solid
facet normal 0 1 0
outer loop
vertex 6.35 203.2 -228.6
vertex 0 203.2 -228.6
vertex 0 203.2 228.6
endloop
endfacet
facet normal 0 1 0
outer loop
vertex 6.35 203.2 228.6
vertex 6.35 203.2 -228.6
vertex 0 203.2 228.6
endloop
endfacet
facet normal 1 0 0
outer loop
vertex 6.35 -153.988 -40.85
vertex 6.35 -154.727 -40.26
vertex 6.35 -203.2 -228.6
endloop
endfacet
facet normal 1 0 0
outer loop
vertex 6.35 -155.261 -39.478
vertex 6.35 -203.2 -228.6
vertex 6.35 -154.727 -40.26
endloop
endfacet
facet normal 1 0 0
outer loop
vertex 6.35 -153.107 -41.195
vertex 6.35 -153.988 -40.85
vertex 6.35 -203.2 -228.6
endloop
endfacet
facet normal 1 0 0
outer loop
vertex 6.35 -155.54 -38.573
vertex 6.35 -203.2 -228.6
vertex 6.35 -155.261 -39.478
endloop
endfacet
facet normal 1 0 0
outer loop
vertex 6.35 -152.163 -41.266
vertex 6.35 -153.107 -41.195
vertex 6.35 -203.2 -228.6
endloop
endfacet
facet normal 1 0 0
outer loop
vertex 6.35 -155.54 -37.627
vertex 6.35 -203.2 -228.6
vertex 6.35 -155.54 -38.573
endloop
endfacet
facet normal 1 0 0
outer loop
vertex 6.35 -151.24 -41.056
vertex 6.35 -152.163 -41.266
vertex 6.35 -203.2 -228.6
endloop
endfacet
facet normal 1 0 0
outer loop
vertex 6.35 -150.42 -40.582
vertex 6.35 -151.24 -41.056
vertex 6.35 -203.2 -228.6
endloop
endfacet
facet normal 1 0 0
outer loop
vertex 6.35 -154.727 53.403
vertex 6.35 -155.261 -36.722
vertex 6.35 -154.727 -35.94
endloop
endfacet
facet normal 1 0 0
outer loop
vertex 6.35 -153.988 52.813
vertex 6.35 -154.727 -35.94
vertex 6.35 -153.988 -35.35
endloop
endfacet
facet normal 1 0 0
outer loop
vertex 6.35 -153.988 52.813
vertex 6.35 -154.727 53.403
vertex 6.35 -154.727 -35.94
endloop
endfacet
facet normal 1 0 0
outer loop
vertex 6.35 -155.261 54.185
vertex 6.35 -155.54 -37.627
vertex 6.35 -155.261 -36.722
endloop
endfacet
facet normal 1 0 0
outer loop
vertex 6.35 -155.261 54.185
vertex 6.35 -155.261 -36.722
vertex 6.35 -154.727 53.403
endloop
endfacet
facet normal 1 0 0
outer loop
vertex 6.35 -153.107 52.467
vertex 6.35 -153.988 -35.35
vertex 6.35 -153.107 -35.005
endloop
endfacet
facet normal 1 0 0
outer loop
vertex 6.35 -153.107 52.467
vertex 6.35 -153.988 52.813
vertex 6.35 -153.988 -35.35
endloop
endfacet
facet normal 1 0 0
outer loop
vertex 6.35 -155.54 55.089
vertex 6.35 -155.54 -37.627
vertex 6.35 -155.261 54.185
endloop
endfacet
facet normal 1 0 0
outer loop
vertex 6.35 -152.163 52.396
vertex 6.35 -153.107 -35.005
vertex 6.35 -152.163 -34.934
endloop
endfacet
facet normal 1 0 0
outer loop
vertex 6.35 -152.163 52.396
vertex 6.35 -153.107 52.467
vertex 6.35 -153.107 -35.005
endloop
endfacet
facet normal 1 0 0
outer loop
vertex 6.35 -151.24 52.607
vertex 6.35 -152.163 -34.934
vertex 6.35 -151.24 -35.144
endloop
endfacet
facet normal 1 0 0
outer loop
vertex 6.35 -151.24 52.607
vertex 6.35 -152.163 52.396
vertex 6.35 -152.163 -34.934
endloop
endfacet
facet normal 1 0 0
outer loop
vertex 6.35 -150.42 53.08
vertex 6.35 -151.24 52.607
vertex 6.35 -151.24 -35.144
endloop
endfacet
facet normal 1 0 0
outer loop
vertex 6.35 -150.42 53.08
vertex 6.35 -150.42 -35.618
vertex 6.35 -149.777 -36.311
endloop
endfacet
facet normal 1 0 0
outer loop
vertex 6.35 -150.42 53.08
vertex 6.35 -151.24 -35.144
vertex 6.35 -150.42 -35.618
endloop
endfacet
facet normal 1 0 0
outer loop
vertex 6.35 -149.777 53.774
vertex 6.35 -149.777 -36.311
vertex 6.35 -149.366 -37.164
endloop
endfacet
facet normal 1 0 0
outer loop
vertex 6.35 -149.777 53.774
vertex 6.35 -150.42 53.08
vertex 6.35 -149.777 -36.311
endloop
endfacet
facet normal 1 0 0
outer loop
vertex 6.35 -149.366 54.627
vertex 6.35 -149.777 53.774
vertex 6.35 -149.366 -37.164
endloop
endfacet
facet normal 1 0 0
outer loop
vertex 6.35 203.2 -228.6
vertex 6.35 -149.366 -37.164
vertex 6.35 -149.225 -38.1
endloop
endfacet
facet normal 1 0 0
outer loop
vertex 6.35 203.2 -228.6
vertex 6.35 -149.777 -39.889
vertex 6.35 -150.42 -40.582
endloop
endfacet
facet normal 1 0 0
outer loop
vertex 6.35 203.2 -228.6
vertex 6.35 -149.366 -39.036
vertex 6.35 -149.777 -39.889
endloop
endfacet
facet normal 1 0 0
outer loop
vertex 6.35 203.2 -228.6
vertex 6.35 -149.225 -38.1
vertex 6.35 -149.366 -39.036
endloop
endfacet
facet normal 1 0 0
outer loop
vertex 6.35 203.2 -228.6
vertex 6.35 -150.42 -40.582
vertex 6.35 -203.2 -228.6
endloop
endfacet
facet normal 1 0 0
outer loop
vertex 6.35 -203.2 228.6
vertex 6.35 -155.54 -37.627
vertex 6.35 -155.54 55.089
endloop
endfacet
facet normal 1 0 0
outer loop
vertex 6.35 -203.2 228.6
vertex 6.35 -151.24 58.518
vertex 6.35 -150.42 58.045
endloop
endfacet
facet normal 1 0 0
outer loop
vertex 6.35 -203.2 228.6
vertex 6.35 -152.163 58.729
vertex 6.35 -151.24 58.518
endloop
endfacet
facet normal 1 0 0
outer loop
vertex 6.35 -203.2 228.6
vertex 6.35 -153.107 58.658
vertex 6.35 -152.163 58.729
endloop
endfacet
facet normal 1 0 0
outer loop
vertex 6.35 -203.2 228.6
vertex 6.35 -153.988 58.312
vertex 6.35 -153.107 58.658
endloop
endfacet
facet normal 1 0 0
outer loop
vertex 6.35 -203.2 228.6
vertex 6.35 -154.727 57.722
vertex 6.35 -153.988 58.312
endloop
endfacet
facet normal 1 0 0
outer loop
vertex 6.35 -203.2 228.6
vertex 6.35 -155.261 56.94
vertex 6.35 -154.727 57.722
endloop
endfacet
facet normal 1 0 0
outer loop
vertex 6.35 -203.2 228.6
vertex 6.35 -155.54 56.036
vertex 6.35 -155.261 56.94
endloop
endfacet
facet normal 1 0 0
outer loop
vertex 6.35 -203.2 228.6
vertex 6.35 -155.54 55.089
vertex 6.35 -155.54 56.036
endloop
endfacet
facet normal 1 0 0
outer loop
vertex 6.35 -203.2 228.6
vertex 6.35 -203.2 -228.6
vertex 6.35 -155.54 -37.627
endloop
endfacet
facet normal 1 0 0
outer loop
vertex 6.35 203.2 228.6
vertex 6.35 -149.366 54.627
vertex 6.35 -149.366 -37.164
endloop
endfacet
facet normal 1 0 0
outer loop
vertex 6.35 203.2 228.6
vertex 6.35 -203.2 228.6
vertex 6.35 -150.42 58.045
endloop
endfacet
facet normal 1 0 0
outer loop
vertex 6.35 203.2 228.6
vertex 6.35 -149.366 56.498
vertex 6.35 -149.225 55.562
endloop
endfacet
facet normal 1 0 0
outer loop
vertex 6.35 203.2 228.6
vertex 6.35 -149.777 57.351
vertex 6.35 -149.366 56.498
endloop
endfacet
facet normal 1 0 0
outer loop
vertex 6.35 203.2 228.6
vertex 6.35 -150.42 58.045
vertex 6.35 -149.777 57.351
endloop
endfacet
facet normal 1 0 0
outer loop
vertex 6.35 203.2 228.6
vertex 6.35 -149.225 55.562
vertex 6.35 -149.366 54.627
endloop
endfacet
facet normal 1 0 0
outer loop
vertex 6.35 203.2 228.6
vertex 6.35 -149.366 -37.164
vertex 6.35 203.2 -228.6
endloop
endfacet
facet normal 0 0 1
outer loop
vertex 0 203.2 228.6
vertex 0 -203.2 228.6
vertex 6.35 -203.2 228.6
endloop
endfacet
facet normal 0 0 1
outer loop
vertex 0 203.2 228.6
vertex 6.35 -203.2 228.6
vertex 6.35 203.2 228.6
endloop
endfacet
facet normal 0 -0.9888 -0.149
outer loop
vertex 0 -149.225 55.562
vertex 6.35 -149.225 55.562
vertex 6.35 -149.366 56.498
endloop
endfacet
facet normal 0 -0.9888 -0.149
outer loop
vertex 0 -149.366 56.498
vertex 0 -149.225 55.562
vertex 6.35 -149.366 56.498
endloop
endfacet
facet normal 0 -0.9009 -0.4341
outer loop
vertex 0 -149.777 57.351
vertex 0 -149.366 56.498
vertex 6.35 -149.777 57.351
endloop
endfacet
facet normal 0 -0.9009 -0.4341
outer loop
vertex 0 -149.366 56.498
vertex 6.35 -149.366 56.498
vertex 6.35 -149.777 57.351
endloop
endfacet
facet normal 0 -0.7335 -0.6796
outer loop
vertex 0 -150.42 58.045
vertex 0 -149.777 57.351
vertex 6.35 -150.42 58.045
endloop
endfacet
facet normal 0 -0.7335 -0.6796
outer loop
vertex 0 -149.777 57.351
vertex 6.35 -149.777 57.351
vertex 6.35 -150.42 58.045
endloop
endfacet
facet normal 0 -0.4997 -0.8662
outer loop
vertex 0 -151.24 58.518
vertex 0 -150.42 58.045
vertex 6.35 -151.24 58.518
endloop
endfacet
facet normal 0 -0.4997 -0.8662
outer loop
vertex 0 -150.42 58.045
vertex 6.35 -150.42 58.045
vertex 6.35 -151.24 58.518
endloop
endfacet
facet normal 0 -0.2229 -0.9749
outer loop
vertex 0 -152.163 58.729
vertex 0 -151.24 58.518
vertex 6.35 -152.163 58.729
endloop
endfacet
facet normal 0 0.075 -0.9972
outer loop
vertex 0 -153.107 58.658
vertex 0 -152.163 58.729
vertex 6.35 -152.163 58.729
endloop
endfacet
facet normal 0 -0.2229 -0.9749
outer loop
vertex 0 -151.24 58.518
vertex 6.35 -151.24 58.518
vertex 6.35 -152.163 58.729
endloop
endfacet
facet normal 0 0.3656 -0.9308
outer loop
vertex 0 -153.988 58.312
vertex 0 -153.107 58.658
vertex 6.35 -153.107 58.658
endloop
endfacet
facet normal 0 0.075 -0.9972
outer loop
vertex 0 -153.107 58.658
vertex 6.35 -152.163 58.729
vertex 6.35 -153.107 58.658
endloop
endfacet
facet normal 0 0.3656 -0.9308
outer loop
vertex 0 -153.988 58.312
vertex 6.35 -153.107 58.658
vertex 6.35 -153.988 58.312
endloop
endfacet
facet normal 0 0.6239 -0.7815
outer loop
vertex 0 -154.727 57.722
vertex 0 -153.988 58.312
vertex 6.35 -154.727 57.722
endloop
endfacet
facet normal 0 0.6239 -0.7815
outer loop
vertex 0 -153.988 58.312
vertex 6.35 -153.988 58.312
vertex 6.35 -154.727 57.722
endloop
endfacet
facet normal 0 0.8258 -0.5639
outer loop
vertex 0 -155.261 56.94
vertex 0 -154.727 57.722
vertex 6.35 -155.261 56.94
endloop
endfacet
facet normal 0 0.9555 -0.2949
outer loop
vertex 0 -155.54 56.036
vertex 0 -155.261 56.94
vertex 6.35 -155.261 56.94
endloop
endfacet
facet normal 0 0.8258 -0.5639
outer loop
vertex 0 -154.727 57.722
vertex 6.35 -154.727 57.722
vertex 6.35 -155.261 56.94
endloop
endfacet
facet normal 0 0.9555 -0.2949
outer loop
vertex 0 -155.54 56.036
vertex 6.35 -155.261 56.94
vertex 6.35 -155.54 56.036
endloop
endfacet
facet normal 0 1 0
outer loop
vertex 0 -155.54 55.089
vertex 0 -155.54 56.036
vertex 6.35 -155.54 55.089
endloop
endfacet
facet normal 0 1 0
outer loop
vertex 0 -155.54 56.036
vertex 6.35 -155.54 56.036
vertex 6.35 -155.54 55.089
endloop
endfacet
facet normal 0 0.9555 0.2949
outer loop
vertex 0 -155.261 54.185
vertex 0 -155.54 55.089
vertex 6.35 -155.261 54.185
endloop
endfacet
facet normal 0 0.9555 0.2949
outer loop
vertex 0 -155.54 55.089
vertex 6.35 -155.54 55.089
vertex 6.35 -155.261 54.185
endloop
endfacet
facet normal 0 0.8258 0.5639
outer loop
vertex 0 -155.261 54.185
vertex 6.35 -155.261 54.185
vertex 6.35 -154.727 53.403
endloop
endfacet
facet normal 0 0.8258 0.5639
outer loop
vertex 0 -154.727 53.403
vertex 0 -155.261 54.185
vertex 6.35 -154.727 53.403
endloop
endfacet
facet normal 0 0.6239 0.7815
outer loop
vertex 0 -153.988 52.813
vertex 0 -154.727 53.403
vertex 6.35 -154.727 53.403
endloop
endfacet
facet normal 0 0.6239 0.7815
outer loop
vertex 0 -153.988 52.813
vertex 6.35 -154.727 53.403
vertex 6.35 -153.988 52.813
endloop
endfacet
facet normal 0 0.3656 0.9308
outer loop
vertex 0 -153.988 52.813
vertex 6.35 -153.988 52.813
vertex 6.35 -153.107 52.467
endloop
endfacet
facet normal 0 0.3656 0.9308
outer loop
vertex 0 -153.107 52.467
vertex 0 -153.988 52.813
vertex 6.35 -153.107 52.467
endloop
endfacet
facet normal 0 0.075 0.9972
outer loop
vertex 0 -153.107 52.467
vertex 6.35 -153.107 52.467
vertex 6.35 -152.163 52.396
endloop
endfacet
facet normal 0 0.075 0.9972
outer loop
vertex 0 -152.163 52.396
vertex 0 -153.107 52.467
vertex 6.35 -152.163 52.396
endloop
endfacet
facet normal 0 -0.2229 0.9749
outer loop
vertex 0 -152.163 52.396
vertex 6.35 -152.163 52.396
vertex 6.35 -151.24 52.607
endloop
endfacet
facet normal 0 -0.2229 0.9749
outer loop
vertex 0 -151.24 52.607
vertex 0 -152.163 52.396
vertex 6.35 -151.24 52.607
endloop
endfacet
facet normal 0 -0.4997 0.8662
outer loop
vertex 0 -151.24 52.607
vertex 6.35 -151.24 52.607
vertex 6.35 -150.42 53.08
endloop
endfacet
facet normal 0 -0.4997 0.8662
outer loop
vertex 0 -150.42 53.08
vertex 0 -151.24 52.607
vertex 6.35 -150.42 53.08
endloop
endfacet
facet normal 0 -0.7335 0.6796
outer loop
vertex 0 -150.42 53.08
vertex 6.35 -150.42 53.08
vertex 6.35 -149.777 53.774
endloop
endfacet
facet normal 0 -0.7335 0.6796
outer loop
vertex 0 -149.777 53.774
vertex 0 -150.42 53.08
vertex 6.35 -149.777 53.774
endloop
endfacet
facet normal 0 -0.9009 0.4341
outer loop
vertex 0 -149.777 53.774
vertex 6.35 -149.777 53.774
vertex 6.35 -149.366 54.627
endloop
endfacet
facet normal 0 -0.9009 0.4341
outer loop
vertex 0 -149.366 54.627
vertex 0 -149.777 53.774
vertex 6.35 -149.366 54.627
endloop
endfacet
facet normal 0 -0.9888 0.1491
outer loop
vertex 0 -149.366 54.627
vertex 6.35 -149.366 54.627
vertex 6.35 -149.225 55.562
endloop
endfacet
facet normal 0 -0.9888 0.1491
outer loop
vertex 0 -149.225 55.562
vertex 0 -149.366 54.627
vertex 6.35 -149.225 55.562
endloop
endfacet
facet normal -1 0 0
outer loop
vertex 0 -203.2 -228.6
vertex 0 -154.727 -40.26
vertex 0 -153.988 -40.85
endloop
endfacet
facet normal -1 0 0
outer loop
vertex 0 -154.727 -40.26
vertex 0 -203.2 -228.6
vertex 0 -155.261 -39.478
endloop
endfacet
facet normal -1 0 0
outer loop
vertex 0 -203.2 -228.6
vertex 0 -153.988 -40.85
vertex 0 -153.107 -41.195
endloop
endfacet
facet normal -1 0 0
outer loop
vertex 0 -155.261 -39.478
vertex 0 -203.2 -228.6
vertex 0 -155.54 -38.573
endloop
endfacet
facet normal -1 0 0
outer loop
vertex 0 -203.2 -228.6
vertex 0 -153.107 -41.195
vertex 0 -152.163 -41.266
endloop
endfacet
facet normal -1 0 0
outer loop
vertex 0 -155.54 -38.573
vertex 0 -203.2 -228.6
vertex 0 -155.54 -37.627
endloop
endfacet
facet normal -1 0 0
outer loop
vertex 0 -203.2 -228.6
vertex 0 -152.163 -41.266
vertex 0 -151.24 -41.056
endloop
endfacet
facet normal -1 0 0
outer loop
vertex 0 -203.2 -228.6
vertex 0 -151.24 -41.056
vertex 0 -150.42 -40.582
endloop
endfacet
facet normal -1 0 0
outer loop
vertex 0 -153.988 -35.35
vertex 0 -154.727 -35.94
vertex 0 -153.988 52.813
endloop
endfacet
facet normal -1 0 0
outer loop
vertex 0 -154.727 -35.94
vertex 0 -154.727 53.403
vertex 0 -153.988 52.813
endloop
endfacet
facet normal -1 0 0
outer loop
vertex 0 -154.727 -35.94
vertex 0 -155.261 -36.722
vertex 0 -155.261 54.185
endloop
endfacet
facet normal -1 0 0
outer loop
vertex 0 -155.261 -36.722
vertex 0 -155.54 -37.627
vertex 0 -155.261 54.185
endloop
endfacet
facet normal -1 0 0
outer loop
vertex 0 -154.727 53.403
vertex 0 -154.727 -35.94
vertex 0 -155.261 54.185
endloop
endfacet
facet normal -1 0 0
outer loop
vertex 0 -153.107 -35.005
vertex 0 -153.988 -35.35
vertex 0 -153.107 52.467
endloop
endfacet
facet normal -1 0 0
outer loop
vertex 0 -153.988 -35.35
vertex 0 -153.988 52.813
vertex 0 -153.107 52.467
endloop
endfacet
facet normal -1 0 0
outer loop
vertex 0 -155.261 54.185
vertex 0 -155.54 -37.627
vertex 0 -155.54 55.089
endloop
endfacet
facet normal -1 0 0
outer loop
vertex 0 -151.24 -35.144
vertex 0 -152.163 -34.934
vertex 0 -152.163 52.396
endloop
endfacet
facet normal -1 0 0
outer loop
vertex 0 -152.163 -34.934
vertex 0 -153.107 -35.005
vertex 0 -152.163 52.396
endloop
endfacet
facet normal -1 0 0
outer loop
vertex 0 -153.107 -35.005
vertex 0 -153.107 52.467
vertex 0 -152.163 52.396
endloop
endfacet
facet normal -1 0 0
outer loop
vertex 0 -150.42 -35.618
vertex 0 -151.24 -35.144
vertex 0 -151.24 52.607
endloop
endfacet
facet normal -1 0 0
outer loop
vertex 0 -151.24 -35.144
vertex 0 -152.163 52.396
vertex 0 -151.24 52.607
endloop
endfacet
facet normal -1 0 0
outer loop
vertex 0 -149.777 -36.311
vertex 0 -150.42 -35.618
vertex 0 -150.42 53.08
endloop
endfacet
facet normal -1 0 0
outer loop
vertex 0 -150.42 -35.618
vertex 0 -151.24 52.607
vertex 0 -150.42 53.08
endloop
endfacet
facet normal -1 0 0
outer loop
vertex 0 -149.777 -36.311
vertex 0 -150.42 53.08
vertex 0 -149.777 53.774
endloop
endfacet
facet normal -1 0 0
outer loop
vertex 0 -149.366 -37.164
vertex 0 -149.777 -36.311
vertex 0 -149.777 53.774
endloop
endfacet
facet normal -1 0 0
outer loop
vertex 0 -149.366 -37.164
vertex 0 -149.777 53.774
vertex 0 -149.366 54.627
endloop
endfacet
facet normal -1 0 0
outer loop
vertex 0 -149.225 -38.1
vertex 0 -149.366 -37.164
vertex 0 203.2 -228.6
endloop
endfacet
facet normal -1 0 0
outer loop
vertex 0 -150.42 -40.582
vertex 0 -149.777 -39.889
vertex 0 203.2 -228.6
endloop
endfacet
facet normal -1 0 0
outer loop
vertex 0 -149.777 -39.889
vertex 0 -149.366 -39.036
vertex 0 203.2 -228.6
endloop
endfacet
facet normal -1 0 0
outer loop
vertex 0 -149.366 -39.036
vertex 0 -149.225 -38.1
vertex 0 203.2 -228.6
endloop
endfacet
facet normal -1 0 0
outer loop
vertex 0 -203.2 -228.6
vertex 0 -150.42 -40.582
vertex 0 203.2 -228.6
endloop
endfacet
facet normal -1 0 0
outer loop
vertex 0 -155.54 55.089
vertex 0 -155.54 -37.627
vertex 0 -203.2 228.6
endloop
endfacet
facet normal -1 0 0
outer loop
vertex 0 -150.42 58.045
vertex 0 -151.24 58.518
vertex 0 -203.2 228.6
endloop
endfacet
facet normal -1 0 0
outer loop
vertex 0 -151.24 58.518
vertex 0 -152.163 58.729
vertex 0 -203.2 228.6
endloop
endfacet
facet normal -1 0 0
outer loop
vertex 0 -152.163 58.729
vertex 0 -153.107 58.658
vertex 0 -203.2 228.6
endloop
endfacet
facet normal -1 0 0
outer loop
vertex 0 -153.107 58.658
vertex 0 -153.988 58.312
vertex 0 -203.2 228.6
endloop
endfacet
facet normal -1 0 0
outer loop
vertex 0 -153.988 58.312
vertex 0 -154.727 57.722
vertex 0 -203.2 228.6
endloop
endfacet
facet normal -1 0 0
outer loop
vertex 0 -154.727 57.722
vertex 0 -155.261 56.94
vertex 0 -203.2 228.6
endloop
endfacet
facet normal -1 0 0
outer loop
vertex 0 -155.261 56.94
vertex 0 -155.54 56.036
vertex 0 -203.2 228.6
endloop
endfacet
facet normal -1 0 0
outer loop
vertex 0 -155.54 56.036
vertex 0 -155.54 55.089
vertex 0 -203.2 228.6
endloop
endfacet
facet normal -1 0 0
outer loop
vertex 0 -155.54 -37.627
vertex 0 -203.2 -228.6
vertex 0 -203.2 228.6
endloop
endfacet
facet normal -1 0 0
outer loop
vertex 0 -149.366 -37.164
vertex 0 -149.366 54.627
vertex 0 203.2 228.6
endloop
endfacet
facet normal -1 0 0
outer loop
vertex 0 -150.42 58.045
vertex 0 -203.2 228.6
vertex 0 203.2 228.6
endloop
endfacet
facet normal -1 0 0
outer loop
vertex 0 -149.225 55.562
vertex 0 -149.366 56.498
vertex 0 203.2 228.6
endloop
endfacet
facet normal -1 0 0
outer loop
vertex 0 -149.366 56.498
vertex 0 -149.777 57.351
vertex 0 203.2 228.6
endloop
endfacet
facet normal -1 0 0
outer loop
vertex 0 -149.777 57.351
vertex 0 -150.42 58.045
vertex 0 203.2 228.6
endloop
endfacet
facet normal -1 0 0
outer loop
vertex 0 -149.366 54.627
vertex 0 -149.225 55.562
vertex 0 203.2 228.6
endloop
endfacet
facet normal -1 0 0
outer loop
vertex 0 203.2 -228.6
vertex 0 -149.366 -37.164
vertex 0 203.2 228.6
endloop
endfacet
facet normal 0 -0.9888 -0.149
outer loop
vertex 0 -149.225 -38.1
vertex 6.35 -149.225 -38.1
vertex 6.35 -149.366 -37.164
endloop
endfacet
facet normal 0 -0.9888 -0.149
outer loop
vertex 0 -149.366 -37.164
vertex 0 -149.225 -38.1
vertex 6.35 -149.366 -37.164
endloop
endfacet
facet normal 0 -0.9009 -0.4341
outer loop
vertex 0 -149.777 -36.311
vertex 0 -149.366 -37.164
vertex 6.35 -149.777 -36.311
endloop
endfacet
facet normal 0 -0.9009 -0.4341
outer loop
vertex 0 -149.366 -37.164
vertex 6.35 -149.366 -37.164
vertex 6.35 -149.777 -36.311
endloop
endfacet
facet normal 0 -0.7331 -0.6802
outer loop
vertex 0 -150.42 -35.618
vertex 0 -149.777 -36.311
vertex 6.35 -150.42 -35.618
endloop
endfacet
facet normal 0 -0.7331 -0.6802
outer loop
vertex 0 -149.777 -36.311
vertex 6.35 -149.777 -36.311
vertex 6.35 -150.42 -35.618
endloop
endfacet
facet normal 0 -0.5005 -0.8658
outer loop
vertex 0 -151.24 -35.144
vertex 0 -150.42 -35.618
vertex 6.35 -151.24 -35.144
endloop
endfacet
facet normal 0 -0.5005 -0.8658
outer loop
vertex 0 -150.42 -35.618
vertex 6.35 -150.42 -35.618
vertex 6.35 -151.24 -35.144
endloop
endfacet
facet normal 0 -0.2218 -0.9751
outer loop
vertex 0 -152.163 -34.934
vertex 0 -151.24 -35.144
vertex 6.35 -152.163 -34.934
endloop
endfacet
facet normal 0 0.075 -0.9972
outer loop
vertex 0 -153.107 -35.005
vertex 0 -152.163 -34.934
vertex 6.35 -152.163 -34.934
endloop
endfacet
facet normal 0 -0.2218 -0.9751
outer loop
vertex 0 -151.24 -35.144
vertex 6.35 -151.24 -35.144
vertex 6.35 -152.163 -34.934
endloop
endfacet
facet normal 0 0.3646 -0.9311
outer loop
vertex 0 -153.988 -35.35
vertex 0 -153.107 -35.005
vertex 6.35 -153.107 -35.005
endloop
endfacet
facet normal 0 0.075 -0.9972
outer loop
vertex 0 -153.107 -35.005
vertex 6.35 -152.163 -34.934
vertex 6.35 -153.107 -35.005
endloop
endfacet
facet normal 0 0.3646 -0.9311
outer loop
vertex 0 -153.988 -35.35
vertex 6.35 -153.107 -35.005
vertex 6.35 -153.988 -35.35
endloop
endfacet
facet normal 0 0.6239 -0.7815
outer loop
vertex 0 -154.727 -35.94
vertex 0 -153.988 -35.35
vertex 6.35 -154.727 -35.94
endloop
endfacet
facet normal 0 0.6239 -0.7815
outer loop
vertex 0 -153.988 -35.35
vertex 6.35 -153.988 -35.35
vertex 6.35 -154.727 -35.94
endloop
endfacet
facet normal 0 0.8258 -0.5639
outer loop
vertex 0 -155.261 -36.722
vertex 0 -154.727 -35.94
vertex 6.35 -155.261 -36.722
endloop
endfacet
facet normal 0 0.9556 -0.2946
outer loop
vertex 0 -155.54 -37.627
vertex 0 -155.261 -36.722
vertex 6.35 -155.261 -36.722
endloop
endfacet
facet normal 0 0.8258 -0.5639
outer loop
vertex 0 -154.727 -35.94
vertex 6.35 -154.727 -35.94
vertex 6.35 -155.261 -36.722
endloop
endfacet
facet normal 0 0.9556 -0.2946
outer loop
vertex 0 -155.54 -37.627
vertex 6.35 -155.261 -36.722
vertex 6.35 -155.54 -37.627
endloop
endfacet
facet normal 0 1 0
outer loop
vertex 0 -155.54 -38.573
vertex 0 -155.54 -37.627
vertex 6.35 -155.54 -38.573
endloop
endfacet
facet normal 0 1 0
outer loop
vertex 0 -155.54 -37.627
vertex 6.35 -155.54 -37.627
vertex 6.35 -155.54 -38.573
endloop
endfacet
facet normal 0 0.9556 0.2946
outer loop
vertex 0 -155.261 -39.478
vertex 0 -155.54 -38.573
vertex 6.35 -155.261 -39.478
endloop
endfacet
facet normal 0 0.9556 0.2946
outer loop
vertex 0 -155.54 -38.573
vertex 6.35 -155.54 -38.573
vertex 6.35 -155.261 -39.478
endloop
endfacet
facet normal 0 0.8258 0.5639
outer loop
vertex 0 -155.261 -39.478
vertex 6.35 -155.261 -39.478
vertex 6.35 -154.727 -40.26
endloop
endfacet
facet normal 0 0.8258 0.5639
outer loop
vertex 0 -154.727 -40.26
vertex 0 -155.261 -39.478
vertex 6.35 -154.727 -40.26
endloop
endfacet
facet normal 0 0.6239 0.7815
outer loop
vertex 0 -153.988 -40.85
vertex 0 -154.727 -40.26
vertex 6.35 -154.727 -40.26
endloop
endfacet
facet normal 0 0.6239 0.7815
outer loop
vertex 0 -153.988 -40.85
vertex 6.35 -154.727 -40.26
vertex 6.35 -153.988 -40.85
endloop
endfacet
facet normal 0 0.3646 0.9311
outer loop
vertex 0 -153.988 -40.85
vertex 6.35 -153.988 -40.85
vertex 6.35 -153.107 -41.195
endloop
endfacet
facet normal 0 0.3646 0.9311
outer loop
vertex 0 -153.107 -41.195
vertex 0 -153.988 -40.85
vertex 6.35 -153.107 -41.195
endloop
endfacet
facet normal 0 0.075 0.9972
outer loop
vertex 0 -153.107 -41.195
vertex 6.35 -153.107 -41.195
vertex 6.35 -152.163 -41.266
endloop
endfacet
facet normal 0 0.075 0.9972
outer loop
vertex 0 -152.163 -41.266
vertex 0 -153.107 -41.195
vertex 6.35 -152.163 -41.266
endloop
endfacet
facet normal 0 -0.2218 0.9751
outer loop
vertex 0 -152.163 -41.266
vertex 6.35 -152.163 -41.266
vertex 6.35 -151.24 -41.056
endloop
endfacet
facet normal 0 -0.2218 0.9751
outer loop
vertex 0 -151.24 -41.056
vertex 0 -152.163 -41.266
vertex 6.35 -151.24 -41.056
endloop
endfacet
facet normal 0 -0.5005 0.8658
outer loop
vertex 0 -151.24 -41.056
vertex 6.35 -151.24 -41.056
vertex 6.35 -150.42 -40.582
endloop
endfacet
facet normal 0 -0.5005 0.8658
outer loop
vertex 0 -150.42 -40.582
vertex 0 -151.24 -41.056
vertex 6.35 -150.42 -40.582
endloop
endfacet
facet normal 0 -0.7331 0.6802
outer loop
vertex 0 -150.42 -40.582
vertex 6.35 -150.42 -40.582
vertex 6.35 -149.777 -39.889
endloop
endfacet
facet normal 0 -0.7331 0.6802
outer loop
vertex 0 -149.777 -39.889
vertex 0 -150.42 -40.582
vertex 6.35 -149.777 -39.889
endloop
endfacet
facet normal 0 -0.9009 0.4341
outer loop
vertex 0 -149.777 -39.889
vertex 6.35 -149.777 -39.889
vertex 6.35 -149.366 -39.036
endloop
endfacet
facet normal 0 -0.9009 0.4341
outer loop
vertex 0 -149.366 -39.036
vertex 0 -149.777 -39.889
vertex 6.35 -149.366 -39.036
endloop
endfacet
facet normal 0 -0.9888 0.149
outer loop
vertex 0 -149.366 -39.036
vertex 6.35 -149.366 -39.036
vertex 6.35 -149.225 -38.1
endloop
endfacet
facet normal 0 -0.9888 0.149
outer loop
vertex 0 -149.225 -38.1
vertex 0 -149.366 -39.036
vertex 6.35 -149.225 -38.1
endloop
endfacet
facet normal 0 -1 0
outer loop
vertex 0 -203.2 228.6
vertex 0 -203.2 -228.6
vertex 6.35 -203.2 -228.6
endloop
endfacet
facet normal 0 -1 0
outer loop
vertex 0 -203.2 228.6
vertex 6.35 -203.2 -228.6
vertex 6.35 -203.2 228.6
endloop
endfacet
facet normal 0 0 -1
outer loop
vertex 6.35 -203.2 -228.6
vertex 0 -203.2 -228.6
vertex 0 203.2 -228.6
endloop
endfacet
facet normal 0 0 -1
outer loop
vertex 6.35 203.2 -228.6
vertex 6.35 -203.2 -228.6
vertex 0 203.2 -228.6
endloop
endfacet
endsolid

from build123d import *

# Parameters (mm, degrees)
F0_W     = 406.4
F0_H     = 457.2
F1_DEPTH = 6.35
F2_R     = 3.175
F3_DEPTH = 6.351


with BuildPart() as f1:
    # F0 (on Right) → F1 (new body)
    with BuildSketch(Plane.YZ):
        Rectangle(F0_W, F0_H)
    extrude(amount=F1_DEPTH)

    # F2 (on face) → F3 (cut, through all)
    with BuildSketch(Plane.YZ.offset(6.35)):
        with Locations((-152.4, -38.1)):
            Circle(F2_R)
        with Locations((-152.4, 55.5625)):
            Circle(F2_R)
    extrude(amount=-F3_DEPTH, mode=Mode.SUBTRACT)


solid = f1.part
